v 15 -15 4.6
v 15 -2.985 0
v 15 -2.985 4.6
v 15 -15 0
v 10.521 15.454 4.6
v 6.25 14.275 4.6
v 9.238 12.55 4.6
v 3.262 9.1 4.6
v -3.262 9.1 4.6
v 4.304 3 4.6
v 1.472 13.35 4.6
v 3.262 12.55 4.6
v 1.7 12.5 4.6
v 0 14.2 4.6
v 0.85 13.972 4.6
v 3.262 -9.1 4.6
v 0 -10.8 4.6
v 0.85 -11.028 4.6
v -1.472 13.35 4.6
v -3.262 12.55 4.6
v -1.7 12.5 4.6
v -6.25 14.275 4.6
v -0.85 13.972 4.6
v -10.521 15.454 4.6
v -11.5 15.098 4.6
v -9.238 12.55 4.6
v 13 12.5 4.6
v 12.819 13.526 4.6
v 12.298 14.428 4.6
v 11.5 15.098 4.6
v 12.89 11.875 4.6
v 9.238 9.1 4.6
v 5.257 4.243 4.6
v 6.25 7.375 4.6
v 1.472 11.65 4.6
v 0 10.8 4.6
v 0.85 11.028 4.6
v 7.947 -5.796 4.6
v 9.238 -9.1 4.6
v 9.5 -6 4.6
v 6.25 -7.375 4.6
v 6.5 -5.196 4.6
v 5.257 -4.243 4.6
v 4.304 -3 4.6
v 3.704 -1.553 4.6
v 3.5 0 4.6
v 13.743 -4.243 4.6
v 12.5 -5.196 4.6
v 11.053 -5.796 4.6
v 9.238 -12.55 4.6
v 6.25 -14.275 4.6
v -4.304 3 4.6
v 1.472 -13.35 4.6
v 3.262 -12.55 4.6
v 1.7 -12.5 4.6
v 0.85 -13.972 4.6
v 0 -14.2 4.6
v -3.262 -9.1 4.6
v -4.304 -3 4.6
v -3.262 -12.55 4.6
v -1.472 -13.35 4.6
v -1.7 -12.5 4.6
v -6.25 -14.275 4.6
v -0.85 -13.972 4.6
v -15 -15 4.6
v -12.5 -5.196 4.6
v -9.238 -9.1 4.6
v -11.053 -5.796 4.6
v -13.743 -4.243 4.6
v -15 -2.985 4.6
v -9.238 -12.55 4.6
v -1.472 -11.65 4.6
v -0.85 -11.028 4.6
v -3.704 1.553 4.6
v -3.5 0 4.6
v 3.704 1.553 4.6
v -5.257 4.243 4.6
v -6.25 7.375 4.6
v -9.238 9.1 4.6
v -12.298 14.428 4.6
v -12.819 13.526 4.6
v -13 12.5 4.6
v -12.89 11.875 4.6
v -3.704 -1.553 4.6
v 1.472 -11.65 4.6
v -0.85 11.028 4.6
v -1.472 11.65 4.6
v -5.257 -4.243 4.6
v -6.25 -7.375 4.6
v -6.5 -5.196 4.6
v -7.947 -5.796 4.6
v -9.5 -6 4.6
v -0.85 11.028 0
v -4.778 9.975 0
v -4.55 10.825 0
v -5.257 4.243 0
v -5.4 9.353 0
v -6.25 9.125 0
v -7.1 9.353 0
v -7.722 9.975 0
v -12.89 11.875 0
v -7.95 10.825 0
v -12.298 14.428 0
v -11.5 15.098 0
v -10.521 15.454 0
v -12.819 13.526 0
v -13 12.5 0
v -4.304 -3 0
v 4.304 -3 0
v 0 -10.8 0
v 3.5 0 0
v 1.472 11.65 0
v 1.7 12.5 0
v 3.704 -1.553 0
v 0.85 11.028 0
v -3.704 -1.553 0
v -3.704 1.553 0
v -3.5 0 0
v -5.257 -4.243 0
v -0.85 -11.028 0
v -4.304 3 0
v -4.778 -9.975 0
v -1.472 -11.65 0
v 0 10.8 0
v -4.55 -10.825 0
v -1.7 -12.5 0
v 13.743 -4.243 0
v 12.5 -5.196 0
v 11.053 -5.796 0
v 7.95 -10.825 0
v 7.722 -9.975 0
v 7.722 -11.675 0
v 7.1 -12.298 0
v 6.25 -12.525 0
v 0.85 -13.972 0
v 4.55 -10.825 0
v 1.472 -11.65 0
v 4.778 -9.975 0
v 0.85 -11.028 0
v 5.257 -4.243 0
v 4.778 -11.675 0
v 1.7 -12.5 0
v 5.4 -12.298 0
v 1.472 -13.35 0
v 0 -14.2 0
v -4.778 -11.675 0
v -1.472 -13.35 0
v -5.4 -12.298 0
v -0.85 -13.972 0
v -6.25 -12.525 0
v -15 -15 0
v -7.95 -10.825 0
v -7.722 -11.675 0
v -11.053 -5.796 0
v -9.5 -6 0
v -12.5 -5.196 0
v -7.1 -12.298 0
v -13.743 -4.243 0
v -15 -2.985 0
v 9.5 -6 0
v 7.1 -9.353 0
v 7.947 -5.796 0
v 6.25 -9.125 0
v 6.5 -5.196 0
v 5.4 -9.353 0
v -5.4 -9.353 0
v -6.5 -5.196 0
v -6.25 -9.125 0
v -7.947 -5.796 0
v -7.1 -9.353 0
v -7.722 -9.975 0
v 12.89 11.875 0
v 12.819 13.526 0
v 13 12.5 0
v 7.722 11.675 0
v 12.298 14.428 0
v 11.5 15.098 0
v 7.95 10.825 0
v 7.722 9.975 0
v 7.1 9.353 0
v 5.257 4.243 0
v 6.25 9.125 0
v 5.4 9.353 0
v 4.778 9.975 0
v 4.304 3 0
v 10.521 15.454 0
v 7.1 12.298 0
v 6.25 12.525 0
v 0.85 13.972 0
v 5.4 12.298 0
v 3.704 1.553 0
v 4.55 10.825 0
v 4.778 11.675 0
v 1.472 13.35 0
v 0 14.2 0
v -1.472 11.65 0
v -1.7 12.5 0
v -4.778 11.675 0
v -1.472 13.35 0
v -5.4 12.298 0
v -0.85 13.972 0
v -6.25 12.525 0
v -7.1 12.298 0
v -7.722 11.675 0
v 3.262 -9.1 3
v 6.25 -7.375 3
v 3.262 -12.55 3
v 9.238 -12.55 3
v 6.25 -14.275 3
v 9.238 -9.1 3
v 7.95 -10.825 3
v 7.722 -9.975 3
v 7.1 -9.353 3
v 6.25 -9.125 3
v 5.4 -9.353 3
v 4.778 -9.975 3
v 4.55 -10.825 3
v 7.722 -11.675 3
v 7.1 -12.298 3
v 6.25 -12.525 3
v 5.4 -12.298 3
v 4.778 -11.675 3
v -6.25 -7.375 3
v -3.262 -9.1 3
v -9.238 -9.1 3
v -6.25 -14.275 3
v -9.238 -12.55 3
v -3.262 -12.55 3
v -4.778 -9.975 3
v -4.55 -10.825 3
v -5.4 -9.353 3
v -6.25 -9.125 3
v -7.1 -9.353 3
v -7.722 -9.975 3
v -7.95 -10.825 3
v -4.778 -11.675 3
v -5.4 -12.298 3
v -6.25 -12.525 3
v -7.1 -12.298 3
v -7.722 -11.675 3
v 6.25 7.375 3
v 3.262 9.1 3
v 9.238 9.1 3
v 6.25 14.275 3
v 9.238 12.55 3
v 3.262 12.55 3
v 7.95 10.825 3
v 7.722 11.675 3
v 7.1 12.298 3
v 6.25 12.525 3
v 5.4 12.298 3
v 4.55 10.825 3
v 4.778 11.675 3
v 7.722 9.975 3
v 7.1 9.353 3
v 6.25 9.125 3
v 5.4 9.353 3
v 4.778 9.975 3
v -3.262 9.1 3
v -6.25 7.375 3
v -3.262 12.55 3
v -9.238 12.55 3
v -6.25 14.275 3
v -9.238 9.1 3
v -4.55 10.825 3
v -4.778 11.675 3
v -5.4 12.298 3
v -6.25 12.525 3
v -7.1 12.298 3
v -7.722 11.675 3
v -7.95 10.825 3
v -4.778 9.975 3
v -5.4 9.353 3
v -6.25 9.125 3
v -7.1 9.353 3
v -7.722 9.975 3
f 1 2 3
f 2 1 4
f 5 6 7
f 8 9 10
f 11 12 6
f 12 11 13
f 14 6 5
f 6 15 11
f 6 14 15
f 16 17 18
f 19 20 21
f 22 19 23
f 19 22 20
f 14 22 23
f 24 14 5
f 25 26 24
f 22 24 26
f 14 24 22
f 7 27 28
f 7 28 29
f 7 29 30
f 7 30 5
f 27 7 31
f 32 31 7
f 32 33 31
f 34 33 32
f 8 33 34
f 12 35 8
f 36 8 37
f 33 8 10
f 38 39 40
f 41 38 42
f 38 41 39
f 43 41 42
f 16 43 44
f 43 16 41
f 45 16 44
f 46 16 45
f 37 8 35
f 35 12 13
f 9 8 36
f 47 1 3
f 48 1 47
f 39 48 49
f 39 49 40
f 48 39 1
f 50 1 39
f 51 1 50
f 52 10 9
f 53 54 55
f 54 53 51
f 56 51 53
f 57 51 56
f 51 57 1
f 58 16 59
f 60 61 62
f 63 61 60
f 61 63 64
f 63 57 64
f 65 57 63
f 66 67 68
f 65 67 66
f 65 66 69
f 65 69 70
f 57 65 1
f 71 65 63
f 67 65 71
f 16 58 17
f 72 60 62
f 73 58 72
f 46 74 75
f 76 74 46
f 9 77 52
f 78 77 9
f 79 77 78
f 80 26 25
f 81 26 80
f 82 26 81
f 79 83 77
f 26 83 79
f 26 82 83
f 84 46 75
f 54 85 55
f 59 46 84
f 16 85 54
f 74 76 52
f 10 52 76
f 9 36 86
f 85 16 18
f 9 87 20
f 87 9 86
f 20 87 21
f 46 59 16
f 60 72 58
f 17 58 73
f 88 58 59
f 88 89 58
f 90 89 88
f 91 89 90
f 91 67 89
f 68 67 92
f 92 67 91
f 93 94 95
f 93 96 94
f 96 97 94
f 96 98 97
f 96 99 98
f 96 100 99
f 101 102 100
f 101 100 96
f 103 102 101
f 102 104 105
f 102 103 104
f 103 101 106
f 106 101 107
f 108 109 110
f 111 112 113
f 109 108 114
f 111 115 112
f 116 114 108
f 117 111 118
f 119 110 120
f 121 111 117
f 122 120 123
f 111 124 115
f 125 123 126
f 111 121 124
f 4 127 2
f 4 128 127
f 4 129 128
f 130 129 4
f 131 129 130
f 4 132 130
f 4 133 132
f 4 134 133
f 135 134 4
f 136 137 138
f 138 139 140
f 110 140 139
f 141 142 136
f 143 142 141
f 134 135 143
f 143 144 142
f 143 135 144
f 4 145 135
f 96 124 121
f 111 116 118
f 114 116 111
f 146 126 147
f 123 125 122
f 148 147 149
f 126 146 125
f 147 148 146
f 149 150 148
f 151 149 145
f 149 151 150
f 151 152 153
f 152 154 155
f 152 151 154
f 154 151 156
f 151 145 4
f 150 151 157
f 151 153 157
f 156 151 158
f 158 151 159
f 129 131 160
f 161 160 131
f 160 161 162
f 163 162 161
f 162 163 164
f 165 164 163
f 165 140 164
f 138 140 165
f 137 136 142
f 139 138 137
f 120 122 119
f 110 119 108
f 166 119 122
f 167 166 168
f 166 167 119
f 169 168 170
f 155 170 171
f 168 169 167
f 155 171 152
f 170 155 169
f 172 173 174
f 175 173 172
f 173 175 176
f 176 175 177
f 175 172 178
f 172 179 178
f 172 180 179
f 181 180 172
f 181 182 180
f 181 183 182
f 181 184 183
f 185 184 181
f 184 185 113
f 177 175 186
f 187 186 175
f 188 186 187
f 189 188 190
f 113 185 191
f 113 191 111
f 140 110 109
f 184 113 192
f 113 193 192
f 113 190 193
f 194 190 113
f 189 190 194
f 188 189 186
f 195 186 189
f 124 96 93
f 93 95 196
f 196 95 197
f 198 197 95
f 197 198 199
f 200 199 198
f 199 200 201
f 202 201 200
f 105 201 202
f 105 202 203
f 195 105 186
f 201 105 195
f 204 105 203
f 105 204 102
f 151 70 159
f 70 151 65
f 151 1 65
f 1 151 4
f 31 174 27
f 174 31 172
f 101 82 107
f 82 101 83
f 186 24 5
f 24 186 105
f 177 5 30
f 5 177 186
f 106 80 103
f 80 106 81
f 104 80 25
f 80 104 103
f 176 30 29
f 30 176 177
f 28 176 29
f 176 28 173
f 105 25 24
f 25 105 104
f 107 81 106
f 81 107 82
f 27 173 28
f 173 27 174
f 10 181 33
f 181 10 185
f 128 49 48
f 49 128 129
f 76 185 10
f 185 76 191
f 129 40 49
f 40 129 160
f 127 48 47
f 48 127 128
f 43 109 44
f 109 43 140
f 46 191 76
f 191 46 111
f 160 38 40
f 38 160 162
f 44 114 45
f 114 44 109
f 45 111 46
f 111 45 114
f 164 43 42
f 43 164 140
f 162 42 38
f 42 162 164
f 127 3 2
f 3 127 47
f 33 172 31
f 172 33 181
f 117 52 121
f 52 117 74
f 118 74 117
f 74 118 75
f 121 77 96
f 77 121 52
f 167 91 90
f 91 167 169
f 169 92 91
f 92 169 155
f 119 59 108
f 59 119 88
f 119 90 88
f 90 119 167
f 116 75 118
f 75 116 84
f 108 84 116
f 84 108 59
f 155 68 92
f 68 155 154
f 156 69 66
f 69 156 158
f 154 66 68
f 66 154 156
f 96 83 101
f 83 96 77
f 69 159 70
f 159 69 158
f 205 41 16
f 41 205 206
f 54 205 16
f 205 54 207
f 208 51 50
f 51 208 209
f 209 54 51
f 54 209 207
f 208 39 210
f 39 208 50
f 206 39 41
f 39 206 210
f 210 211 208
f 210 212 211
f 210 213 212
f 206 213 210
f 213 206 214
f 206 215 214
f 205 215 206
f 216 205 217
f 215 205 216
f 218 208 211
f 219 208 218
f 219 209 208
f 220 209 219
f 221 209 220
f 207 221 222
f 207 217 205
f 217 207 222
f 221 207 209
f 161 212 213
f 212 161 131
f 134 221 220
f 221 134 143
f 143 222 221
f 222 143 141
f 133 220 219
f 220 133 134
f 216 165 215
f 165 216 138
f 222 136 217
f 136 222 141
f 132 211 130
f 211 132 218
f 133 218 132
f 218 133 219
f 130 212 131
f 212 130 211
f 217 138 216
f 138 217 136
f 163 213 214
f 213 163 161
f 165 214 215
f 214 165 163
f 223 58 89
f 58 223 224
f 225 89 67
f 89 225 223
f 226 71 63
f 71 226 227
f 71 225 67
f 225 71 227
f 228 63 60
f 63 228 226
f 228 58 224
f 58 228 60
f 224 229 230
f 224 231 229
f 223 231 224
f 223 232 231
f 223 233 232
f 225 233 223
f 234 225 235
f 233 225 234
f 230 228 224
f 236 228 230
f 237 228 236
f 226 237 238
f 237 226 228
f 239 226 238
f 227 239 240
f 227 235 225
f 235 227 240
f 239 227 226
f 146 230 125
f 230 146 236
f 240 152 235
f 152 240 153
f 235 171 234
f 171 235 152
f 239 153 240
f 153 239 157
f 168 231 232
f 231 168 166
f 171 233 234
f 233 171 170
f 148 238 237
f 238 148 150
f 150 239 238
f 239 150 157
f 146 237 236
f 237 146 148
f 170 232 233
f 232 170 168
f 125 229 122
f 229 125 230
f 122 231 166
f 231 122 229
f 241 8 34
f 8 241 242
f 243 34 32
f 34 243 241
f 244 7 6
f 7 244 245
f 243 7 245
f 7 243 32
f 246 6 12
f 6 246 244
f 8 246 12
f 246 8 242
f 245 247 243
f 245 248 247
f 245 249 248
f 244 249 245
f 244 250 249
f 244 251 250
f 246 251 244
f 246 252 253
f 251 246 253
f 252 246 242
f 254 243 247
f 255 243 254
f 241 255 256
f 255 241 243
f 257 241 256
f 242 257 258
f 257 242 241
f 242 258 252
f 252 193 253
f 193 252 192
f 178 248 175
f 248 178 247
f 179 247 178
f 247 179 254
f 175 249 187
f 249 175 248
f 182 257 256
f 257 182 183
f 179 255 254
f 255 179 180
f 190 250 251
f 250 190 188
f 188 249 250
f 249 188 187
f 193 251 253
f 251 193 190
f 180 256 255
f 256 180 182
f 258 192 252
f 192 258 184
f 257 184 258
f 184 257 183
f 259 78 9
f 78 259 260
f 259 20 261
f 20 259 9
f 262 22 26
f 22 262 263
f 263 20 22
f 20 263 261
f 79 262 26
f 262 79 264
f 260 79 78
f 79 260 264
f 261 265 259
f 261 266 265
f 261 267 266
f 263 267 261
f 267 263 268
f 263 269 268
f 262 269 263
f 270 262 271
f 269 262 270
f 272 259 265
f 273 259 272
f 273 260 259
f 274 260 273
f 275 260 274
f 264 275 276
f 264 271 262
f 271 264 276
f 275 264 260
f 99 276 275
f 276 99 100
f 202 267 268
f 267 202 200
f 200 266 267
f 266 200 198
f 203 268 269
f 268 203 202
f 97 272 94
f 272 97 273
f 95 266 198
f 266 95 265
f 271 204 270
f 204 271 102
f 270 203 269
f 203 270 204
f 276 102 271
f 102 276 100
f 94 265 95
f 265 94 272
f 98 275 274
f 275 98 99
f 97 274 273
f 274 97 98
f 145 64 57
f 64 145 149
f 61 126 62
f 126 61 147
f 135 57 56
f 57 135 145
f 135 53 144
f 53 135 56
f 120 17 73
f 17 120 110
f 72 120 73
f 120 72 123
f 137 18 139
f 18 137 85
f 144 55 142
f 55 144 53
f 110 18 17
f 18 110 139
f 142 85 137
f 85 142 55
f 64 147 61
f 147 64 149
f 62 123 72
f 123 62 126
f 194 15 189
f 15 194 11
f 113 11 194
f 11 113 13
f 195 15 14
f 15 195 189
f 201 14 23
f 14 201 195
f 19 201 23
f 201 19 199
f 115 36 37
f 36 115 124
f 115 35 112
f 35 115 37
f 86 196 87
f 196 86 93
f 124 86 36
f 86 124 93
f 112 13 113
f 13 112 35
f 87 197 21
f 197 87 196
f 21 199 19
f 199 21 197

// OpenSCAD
// file: configuration.scad
// Increase this if your slicer or printer make holes too tight.
extra_radius = 0.2;

// OD = outside diameter, corner to corner.
m3_nut_od = 6.1;
m3_nut_radius = m3_nut_od/2 + 0.2 + extra_radius;
m3_washer_radius = 3.5 + extra_radius;

// Major diameter of metric 3mm thread.
m3_major = 3;
m3_radius = m3_major/2 + extra_radius;
m3_wide_radius = m3_major/2 + extra_radius + 0.2;

// NEMA17 stepper motors.
motor_shaft_diameter = 5;
motor_shaft_radius = motor_shaft_diameter/2 + extra_radius;

// Frame brackets. M3x8mm screws work best with 3.6 mm brackets.
thickness = 3.6;

// OpenBeam or Misumi. Currently only 15x15 mm, but there is a plan
// to make models more parametric and allow 20x20 mm in the future.
extrusion = 15;

// Placement for the NEMA17 stepper motors.
motor_offset = 44;
motor_length = 47;

//Hot End Parameters
nozzle_distance = 19; //Approximately 3/4"
mount_radius = 12.5;  //Hotend mounting screws, standard would be 25mm.
hotend_radius = 8;  //Hole for the hotend (J-Head diameter is 16mm).
groove_radius = 6;  //Radius of hot end in groove region
groove_height = 4.6;  //Thickness of hot end groove region
// main file
include <configuration.scad>;

barrel_radius = hotend_radius + 1;
barrel_height = 30;
fan_offset = 18;
include_fan_bracket = false;

module hotend_fan() {
  difference() {
    union() {

		if(include_fan_bracket)
		{
		    translate([0, 2 - fan_offset, 15])
			cube([35, 35, 30], center=true);
		}
		
		if(!include_fan_bracket)
		{
		    translate([0, 6 - fan_offset,groove_height / 2])
			cube([30, 6, groove_height], center=true);
		}		

		//      translate([0, 2 - fan_offset, 0])
        //cylinder(r=17, h=30, $fn=6);
      translate([0, 0, groove_height/2])
		{
        cube([30, 23, groove_height], center=true);

		}
		translate([0,12.5,0])
		hull()
		{
			translate([10,0,0])
			cylinder(r=3, h=groove_height, $fn=18);
			translate([-10,0,0])
			cylinder(r=3, h=groove_height, $fn=18);
		}
    }
    // Opposite side cutaway (outgoing airflow).
    translate([0, 40, groove_height + 0.01]) rotate([0, 0, 30])
      cylinder(r=40, h=200, $fn=6);


    // Keep printed plastic away from the hotend.
		translate([0, -15,15])
		rotate([-75,0,0])
		cylinder(r=8, h=20);
	
	//notch for heater blocks
		translate([0,-5,30])
		cube([40,13,6], center=true);

		//remove point between barrels
		translate([0,0,10])
		cube([20,53,6], center=true);
		
		//remove point between barrels
		translate([0,-5,25])
		cube([nozzle_distance,10,6], center=true);
	
	translate([nozzle_distance / 2,0,0]){
    // Groove mount.
    cylinder(r=groove_radius, h=200, center=true, $fn=24);
    // J-Head barrel.
    translate([0, 0, groove_height + 0.02])
      cylinder(r=barrel_radius + 1, h=100, $fn=24);
	    // Groove mount insert slot.
		rotate([0,0,-45])
    translate([0, 10, 0])
      cube([2*groove_radius, 20, 20], center=true);
	}

	translate([-nozzle_distance / 2,0,0]){
    // Groove mount.
    cylinder(r=groove_radius, h=200, center=true, $fn=24);
    // J-Head barrel.
    translate([0, 0, groove_height + 0.02])
      cylinder(r=barrel_radius + 1, h=100, $fn=24);

	
    // Groove mount insert slot.
	rotate([0,0,45])
    translate([0, 10, 0])
      cube([2*groove_radius, 20, 20], center=true);
	}

	if(include_fan_bracket)
	{
	 // Fan mounting surface and screws.
    translate([0, -50 - fan_offset, 0])
      cube([100, 100, 100], center=true);
    for (x = [-12, 12]) {
      for (z = [-12, 12]) {
        translate([x, -fan_offset, z+15]) rotate([90, 0, 0]) #
          cylinder(r=m3_radius, h=16, center=true, $fn=12);
      }
    }
    // Vertical inner space.
    intersection() {
      cube([22, 100, 100], center=true);
      translate([0, -12, groove_height])
        cylinder(r=16, h=10, $fn=6);
    }
    // Air funnel.
    difference() {
      translate([0, -1 - fan_offset, 15]) rotate([-90, 0, 0])
        cylinder(r1=15, r2=10, h=12, $fn=36);



    }
	}
   

		union(){
      rotate([0, 0, -150]) translate([0, 12.5, 5]) {
			#cylinder(r=m3_nut_radius, h=4, center=true, $fn=6);
			#cylinder(r=m3_radius, h=12, center=true, $fn=12);
		}

	   rotate([0, 0, -180]) translate([0, 12.5, 5]) 
		{
		
		#cylinder(r=m3_radius, h=12, center=true, $fn=12);
		}

      rotate([0, 0, -210]) translate([0, 12.5, 5]) 
	  {
		#cylinder(r=m3_nut_radius, h=4, center=true, $fn=6);
		#cylinder(r=m3_radius, h=12, center=true, $fn=12);
	  }

		rotate([0, 0, -30]) translate([0, 12.5, 5]) 
		{
			#cylinder(r=m3_nut_radius, h=4, center=true, $fn=6);
			#cylinder(r=m3_radius, h=12, center=true, $fn=12);
		}

		      rotate([0, 0, 30]) translate([0, 12.5, 5]) {
			#cylinder(r=m3_nut_radius, h=4, center=true, $fn=6);
			#cylinder(r=m3_radius, h=12, center=true, $fn=12);
		}

	      translate([0, 12.5, 5]) {
			
			#cylinder(r=m3_radius, h=12, center=true, $fn=12);
		}
    }




  }
}
hotend_fan();

		


// Hotend barrel.
translate([nozzle_distance / 2, 0, groove_height]) %
  cylinder(r=barrel_radius, h=barrel_height);
translate([-nozzle_distance / 2, 0, groove_height]) %
  cylinder(r=barrel_radius, h=barrel_height);
  
 translate([nozzle_distance / 2, 0, groove_height + barrel_height -1]) %
cube([20,20,10], center=true);
translate([-nozzle_distance / 2, 0, groove_height + barrel_height -1]) %
cube([20,20,10], center=true);

if(include_fan_bracket)
{
	// 30mm fan.
	translate([0, -5 - fan_offset, 15]) % difference() {
	  cube([30, 10, 30], center=true);
	  rotate([90, 0, 0,]) cylinder(r=14, h=20, center=true);
	}
}
